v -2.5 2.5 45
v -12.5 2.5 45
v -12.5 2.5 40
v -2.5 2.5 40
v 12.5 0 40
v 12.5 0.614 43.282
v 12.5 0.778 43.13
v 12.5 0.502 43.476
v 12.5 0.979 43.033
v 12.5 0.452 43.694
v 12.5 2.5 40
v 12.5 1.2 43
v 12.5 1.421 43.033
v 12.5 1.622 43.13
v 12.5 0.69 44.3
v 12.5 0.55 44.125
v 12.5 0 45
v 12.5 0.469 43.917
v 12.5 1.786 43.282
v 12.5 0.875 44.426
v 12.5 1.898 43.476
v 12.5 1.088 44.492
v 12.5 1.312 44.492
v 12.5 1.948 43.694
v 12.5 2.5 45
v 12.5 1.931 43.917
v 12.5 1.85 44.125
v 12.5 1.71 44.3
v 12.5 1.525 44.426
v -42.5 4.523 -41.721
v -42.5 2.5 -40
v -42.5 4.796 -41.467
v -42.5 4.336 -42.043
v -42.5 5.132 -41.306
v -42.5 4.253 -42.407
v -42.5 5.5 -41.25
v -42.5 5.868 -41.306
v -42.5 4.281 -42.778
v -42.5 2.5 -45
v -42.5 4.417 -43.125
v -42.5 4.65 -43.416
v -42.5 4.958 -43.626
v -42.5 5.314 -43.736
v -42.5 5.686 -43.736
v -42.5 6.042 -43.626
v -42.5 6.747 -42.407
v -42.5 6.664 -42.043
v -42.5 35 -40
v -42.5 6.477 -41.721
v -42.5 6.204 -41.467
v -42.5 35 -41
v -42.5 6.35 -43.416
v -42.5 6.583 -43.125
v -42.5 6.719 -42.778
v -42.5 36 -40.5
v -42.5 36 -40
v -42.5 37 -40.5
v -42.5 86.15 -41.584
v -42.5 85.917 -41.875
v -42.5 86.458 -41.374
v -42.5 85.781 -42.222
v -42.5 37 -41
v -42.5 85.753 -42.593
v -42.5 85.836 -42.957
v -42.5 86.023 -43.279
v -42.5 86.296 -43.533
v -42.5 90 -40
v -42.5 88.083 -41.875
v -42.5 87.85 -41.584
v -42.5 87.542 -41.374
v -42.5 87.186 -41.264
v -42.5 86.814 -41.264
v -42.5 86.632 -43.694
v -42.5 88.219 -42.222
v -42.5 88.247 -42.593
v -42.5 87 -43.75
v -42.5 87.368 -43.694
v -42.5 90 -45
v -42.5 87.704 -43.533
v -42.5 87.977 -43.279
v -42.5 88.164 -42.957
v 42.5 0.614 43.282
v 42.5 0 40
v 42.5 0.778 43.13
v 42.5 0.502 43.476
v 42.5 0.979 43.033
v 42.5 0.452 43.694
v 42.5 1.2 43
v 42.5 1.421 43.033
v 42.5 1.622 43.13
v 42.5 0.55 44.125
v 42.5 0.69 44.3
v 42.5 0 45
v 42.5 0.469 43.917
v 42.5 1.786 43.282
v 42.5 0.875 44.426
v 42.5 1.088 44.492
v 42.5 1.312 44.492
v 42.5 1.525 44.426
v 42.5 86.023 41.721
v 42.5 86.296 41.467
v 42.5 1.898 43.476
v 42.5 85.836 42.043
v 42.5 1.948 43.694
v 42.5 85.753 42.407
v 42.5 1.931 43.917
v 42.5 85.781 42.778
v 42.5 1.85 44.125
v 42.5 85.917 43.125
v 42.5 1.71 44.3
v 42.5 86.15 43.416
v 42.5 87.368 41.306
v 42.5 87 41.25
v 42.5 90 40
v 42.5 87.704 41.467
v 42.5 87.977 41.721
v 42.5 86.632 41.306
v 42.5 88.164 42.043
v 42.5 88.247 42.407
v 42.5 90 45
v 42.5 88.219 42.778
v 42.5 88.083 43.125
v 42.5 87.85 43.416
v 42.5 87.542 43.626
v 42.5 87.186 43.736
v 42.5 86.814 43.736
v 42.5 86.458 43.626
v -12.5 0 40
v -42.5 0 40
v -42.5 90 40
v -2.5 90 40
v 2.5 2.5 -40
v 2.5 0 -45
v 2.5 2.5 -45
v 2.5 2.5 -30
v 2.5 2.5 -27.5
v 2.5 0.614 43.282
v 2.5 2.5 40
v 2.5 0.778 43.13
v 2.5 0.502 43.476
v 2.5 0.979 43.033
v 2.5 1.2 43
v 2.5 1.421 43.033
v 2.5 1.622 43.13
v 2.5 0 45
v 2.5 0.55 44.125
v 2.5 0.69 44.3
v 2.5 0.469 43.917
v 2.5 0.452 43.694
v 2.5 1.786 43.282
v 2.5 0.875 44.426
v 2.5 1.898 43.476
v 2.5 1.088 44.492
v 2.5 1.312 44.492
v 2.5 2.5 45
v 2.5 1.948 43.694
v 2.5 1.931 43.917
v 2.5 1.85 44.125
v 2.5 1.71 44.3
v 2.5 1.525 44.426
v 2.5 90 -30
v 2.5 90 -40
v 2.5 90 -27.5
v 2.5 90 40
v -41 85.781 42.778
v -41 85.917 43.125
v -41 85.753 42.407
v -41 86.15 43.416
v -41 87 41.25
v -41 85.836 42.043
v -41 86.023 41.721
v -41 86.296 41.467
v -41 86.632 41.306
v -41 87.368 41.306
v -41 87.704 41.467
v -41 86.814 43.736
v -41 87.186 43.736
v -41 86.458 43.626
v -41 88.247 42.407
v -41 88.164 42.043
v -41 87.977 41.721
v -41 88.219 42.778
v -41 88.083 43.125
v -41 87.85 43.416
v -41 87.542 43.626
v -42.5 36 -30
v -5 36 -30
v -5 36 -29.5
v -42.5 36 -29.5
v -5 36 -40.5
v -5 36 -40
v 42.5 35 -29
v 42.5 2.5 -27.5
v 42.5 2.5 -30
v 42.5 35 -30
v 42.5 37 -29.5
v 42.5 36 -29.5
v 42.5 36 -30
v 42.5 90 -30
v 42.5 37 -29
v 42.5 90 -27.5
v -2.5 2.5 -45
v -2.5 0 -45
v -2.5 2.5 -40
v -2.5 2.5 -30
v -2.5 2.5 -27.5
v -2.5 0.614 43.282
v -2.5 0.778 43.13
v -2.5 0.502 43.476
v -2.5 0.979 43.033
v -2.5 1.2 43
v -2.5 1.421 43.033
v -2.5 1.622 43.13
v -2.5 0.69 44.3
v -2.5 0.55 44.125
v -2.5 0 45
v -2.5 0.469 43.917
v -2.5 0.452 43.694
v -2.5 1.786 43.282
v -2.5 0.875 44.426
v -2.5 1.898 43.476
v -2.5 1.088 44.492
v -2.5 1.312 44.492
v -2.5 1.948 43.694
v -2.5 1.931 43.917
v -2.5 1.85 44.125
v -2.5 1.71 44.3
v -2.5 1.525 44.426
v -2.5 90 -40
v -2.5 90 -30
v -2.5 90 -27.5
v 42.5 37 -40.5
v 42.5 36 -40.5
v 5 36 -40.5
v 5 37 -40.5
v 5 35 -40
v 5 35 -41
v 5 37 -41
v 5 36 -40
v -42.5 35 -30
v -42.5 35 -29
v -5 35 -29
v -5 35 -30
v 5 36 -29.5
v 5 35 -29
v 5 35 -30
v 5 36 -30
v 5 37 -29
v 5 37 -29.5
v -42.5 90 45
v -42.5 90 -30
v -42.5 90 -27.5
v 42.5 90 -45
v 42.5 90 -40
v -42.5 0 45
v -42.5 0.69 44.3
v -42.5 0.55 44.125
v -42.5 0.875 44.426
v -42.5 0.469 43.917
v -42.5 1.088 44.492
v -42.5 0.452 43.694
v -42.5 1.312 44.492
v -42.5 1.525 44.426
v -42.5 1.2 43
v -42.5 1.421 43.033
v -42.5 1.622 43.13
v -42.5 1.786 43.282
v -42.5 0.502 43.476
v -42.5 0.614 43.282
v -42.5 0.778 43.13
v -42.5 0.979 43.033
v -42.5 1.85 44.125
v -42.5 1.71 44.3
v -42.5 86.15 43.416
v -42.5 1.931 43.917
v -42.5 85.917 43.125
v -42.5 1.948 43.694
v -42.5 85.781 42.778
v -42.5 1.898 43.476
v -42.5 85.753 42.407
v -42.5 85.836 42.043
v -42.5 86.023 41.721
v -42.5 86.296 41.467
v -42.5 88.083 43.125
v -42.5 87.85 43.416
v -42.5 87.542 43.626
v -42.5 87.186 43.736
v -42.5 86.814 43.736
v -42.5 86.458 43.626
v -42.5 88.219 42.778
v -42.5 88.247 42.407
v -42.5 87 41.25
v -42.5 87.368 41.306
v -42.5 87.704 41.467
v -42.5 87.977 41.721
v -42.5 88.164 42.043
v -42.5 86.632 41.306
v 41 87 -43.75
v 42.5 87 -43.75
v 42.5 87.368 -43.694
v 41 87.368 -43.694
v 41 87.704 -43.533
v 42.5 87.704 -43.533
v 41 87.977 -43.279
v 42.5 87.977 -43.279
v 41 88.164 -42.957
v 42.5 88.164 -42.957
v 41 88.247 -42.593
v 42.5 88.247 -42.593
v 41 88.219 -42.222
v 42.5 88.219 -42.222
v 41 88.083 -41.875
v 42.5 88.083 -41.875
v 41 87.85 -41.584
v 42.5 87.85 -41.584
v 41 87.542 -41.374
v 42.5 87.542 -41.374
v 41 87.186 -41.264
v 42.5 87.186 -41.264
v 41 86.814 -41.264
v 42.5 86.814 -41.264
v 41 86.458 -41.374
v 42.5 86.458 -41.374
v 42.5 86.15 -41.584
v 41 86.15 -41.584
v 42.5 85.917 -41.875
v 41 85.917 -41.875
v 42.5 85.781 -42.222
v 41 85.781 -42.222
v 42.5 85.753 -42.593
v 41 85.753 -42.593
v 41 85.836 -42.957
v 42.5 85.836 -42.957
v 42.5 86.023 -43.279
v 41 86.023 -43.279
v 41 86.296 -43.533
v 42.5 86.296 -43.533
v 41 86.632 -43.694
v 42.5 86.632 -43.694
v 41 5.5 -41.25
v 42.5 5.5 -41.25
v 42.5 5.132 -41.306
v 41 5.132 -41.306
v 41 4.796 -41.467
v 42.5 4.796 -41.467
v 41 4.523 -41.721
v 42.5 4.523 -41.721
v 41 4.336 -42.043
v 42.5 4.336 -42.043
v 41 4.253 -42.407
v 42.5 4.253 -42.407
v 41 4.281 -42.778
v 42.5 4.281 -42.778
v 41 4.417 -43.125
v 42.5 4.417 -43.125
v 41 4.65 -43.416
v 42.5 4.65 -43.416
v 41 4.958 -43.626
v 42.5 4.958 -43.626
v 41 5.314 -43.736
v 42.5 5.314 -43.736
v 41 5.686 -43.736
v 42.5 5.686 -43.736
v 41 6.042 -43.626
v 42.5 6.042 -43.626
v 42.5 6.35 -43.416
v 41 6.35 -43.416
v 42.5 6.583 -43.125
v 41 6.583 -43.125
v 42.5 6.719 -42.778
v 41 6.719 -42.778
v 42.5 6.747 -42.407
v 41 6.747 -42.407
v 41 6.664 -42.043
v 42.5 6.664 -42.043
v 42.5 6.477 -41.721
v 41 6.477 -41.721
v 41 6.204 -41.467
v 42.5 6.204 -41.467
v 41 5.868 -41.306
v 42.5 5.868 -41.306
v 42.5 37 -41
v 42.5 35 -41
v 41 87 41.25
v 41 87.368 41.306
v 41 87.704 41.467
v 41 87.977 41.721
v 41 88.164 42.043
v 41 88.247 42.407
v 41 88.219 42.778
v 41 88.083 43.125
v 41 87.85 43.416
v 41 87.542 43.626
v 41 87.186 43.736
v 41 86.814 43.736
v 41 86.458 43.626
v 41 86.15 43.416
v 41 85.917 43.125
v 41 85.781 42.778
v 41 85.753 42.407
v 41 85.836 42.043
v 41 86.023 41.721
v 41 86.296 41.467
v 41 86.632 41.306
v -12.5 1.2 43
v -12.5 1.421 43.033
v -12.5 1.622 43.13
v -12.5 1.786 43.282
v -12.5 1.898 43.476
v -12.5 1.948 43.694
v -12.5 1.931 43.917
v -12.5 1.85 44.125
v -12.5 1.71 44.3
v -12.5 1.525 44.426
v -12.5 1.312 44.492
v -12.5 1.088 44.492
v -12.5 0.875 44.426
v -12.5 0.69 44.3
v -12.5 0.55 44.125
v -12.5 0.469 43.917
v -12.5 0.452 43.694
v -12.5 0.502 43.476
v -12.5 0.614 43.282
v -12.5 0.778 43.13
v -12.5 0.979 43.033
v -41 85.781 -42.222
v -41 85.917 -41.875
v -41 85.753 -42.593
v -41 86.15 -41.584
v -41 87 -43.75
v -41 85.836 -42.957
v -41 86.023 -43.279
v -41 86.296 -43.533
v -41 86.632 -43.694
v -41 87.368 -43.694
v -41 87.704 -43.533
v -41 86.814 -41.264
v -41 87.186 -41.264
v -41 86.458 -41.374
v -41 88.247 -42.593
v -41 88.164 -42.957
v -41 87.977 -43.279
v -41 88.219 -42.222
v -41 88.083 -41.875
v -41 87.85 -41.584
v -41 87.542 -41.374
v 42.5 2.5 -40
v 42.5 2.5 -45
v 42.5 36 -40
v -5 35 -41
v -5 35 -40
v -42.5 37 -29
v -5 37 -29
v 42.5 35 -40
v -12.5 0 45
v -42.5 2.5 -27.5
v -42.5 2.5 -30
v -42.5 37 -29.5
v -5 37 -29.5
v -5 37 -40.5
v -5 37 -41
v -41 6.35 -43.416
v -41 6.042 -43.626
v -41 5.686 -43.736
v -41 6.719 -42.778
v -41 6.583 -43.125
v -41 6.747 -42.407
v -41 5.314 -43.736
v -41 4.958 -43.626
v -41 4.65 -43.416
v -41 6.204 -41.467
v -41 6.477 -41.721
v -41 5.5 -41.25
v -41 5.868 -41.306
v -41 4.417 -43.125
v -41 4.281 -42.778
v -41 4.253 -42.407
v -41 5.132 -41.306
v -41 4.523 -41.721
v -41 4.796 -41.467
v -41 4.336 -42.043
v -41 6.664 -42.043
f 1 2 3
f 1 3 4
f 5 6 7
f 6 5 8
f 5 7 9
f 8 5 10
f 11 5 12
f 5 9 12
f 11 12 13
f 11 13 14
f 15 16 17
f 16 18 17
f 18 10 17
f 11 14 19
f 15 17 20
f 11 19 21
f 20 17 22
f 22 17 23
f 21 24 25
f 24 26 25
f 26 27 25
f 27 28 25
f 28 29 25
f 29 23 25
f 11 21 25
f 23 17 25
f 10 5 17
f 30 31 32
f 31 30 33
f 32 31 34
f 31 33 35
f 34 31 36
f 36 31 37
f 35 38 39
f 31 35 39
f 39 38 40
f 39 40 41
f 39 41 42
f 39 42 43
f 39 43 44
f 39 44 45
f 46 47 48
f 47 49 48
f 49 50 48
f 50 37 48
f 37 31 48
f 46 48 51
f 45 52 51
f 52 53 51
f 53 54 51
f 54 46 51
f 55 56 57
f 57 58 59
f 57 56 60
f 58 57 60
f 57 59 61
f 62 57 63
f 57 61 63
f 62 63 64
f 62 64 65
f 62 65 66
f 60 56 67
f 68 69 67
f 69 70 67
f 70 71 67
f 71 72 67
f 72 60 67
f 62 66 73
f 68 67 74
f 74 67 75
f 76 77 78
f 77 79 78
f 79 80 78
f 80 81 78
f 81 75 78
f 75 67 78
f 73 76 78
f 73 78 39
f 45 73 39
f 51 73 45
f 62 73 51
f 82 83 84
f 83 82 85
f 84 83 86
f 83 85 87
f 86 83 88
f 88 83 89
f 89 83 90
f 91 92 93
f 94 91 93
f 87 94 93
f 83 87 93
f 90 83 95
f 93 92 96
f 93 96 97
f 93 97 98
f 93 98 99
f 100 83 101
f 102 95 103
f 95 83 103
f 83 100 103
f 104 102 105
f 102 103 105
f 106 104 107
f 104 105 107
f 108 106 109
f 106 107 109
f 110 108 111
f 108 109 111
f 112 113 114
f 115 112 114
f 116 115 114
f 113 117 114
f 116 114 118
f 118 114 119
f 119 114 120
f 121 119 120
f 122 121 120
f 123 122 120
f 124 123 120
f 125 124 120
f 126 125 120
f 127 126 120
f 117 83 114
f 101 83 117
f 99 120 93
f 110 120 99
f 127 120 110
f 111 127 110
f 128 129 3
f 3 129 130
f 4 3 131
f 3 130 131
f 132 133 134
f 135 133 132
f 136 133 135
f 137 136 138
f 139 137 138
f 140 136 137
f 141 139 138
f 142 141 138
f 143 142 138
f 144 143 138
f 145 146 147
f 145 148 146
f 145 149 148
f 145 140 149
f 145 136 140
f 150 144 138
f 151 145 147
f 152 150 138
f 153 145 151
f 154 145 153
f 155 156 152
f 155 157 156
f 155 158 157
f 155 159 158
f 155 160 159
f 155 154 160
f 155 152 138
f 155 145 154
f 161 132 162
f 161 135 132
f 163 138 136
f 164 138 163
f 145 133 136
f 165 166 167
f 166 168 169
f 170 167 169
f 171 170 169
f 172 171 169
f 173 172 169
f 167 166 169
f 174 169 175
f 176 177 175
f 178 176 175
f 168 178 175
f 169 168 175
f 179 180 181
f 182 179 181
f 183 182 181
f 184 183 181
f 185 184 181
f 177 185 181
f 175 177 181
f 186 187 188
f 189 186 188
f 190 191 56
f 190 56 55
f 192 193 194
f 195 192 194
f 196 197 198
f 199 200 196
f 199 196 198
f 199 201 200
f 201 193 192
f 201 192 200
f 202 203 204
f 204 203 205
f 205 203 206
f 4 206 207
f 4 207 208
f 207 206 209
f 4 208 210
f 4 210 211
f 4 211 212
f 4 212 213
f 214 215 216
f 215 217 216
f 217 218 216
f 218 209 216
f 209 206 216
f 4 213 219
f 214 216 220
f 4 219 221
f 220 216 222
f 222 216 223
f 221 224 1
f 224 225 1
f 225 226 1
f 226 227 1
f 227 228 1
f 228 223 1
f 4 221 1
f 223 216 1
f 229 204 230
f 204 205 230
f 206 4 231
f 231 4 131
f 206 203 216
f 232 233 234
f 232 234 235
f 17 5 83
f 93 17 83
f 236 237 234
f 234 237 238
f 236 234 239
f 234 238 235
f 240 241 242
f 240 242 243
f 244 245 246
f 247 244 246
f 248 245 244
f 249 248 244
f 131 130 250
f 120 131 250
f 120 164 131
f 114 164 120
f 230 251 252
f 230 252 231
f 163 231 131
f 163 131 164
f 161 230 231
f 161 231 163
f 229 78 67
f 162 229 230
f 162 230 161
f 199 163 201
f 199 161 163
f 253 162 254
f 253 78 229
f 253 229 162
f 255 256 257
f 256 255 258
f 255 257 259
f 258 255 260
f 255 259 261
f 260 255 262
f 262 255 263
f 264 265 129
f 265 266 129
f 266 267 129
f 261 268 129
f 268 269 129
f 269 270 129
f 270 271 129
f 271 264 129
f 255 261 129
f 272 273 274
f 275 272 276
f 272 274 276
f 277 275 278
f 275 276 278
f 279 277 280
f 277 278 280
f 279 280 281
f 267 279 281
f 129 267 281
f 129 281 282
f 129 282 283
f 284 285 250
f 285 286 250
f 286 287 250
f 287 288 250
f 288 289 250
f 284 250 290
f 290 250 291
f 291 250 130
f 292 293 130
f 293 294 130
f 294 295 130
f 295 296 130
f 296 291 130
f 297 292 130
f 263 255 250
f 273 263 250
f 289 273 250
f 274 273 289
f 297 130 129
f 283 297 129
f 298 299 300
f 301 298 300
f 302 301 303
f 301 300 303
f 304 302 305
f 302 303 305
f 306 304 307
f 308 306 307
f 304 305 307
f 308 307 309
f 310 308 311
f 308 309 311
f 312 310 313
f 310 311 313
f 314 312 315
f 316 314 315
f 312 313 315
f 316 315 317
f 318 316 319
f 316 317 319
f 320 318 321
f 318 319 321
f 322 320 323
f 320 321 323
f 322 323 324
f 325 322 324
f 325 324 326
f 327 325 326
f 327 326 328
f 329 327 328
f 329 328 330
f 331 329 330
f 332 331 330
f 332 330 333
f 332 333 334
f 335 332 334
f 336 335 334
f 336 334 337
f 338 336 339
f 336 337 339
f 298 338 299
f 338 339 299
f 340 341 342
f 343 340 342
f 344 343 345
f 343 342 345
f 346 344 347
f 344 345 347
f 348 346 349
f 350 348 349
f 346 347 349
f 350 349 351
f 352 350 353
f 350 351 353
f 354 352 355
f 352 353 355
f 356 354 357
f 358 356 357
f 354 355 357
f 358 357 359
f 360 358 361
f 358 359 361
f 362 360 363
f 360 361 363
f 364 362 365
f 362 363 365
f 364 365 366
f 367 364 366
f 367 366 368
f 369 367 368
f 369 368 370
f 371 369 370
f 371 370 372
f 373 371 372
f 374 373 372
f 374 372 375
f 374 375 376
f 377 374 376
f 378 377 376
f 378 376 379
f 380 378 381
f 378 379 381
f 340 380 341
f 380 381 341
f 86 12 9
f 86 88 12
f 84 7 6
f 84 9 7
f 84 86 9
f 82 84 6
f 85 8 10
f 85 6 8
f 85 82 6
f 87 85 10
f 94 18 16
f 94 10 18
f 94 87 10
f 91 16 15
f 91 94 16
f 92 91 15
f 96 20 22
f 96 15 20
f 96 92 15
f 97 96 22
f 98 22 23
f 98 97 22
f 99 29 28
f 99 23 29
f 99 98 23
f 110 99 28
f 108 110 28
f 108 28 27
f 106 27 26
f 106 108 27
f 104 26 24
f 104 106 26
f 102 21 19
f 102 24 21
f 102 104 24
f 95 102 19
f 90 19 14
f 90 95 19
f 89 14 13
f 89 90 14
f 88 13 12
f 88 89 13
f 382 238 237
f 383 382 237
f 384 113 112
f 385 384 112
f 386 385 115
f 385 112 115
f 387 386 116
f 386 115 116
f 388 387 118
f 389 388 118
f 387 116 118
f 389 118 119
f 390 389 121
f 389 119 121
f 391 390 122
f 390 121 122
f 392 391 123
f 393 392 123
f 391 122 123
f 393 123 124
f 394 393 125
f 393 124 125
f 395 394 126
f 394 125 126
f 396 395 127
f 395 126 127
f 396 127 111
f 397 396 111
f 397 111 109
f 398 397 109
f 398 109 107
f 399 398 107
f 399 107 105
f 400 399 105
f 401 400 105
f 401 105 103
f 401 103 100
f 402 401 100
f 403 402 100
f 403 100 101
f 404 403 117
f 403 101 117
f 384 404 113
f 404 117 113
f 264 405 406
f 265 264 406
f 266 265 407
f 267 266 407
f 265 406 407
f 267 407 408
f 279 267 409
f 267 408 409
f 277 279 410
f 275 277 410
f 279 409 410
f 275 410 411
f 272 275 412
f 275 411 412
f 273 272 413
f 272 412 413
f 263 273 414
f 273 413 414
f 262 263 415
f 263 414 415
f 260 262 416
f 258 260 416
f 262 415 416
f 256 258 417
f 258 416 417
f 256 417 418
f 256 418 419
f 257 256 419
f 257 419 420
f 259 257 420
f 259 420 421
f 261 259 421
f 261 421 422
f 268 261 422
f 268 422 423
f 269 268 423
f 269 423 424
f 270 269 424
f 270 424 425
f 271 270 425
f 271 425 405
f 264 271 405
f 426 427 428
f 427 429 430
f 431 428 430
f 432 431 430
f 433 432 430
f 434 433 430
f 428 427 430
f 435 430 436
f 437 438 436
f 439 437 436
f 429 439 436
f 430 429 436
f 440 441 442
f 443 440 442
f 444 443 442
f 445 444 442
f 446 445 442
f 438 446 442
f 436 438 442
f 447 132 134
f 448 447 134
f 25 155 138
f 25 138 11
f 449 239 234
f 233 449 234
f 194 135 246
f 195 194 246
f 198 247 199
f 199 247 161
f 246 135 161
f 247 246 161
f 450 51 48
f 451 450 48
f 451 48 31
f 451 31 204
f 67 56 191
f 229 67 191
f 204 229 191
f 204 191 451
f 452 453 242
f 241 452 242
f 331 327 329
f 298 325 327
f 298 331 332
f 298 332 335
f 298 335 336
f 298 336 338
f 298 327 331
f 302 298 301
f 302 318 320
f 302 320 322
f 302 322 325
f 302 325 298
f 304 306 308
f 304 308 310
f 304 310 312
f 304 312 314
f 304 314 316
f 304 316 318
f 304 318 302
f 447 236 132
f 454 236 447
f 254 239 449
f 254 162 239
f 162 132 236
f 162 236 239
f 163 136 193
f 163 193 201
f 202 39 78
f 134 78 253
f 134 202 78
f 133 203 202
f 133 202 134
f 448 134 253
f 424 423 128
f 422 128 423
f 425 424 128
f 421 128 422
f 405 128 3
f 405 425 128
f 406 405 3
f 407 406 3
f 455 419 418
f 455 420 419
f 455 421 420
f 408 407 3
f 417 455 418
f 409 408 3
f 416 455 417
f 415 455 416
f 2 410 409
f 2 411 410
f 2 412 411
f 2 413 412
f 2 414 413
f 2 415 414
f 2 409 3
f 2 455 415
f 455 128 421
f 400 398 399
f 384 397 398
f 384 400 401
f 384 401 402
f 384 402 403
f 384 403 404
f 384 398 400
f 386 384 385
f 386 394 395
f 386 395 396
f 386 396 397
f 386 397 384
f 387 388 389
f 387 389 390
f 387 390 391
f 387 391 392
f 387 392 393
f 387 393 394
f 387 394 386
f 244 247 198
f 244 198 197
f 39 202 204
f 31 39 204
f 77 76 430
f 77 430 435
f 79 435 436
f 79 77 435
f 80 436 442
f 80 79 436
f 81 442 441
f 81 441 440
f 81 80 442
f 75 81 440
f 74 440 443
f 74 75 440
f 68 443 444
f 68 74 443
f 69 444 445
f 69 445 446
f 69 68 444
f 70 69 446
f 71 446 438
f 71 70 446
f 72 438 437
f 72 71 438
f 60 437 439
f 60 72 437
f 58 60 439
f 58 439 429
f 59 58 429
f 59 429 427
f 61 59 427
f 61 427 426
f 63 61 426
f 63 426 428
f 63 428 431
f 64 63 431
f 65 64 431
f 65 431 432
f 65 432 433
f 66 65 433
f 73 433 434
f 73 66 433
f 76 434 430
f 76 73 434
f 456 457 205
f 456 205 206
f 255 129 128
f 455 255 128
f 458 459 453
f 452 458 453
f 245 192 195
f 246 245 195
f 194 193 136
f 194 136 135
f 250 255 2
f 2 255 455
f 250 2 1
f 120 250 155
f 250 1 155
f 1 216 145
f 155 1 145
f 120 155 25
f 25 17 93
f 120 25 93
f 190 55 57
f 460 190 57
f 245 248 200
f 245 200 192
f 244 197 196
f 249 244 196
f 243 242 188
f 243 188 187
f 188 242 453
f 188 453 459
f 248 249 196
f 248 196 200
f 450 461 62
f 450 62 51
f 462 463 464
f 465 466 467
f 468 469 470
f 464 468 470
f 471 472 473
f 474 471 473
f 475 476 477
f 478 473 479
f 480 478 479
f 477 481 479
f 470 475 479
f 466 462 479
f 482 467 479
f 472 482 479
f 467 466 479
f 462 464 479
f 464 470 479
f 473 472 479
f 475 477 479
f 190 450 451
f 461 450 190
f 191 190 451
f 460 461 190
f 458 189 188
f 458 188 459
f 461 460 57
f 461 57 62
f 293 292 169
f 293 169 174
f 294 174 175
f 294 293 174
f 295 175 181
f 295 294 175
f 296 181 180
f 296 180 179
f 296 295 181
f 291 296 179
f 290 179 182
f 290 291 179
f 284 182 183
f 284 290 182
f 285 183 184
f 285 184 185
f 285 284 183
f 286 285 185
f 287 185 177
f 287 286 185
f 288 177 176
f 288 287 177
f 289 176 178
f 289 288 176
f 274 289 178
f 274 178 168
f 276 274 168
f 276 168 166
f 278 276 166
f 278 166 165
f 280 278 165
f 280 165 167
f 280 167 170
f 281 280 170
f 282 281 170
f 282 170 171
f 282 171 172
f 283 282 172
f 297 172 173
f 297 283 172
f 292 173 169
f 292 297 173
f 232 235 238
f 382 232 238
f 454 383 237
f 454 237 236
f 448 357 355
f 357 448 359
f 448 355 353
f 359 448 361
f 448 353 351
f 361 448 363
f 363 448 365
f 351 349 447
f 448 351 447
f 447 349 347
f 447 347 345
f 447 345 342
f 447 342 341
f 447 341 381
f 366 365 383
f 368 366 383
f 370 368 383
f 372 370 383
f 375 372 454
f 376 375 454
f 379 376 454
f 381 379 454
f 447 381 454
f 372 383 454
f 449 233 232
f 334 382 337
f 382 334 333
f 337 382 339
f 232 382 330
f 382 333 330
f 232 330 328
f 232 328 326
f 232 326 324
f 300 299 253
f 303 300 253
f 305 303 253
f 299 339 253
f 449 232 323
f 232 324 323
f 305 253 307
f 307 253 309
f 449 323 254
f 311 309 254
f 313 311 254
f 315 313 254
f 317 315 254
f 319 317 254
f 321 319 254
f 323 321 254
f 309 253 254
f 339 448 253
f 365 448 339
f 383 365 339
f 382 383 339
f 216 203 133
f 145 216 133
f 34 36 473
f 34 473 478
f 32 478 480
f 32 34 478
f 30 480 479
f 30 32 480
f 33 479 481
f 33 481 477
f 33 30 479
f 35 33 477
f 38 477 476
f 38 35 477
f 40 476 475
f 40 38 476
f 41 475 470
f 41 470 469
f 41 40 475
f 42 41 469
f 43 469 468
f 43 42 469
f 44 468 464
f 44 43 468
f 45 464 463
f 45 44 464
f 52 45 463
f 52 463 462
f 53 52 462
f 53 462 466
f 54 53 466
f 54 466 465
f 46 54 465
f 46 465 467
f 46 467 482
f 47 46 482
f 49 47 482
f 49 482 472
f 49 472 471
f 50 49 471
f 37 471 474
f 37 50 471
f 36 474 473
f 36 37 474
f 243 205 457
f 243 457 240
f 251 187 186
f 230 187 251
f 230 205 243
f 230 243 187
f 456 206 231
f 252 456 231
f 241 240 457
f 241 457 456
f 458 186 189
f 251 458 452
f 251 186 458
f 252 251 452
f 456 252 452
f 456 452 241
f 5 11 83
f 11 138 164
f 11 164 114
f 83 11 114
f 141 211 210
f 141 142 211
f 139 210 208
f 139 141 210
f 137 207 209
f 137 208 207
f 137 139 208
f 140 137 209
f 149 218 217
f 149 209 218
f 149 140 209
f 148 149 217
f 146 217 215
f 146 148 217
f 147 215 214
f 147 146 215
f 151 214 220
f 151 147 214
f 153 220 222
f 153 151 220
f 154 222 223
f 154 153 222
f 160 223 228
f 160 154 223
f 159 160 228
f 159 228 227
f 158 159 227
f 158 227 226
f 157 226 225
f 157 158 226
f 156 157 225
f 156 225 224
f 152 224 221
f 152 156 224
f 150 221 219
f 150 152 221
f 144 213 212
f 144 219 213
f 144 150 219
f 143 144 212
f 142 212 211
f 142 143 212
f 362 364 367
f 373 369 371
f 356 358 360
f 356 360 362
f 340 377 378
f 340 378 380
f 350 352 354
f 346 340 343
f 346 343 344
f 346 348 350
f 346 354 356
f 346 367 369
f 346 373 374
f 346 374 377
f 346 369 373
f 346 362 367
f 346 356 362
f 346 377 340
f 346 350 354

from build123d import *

# Parameters (mm, degrees)
SKETCH1_W                = 90
SKETCH1_H                = 90
BOSS_EXTRUDE1_DEPTH      = 90
SKETCH4_W                = 40
SKETCH4_H                = 80
CUT_EXTRUDE3_DEPTH       = 90
SKETCH6_W                = 10
SKETCH6_H                = 2.5
CUT_EXTRUDE5_DEPTH       = 10
CUT_EXTRUDE6_DEPTH       = 90
CUT_EXTRUDE7_DEPTH       = 90
SKETCH10_W               = 2.5
SKETCH10_H               = 90
BOSS_EXTRUDE2_DEPTH      = 40
SKETCH11_W               = 2.5
SKETCH11_H               = 90
BOSS_EXTRUDE3_DEPTH      = 40
CUT_EXTRUDE10_DEPTH      = 37.5
SKETCH16_R               = 0.75
CUT_EXTRUDE12_DEPTH      = 1.5
CUT_EXTRUDE13_DEPTH      = 111.227038425
CUT_EXTRUDE13_DEPTH_BACK = 111.227038425
SKETCH17_R               = 0.75
SKETCH21_W               = 85
SKETCH21_H               = 2.5
CUT_EXTRUDE14_DEPTH      = 40
SKETCH22_W               = 85
SKETCH22_H               = 2.5
CUT_EXTRUDE15_DEPTH      = 40
SKETCH23_R               = 1.25
CUT_EXTRUDE16_DEPTH      = 1.5
SKETCH24_R               = 1.25
CUT_EXTRUDE17_DEPTH      = 1.5


with BuildPart() as part:
    # Sketch1 → Boss-Extrude1 (new body)
    with BuildSketch(Plane(origin=(0, 0, 0), x_dir=(1, 0, 0), z_dir=(0, 1, 0))):
        Rectangle(SKETCH1_W, SKETCH1_H)
    extrude(amount=BOSS_EXTRUDE1_DEPTH)

    # Sketch4 → Cut-Extrude3 (cut)
    with BuildSketch(Plane(origin=(0, 90, 0), x_dir=(1, 0, 0), z_dir=(0, 1, 0))):
        with Locations((-22.5, 0)):
            Rectangle(SKETCH4_W, SKETCH4_H)
        with Locations((22.5, 0)):
            Rectangle(SKETCH4_W, SKETCH4_H)
    extrude(amount=-CUT_EXTRUDE3_DEPTH, mode=Mode.SUBTRACT)

    # Sketch6 → Cut-Extrude5 (cut)
    with BuildSketch(Plane.XY.offset(45)):
        with Locations((7.5, 1.25)):
            Rectangle(SKETCH6_W, SKETCH6_H)
        with Locations((-7.5, 1.25)):
            Rectangle(SKETCH6_W, SKETCH6_H)
    extrude(amount=-CUT_EXTRUDE5_DEPTH, mode=Mode.SUBTRACT)

    # Sketch7 → Cut-Extrude6 (cut)
    with BuildSketch(Plane(origin=(0, 90, 0), x_dir=(1, 0, 0), z_dir=(0, 1, 0))):
        Polygon((42.5, 40), (42.5, 45), (45, 45), (45, -45), (42.5, -45), (42.5, -40), align=None)
    extrude(amount=-CUT_EXTRUDE6_DEPTH, mode=Mode.SUBTRACT)

    # Sketch8 → Cut-Extrude7 (cut)
    with BuildSketch(Plane(origin=(0, 90, 0), x_dir=(1, 0, 0), z_dir=(0, 1, 0))):
        Polygon((-42.5, 40), (-42.5, 45), (-45, 45), (-45, -45), (-42.5, -45), (-42.5, -42.5), align=None)
    extrude(amount=-CUT_EXTRUDE7_DEPTH, mode=Mode.SUBTRACT)

    # Sketch10 → Boss-Extrude2 (add)
    with BuildSketch(Plane.ZY.offset(2.5)):
        with Locations((-28.75, 45)):
            Rectangle(SKETCH10_W, SKETCH10_H)
    extrude(amount=BOSS_EXTRUDE2_DEPTH)

    # Sketch11 → Boss-Extrude3 (add)
    with BuildSketch(Plane(origin=(2.5, 0, 0), x_dir=(0, 0, -1), z_dir=(1, 0, 0))):
        with Locations((28.75, 45)):
            Rectangle(SKETCH11_W, SKETCH11_H)
    extrude(amount=BOSS_EXTRUDE3_DEPTH)

    # Sketch13 → Cut-Extrude10 (cut)
    with BuildSketch(Plane(origin=(42.5, 0, 0), x_dir=(0, 0, -1), z_dir=(1, 0, 0))):
        Polygon((40, 36), (40.5, 36), (40.5, 37), (41, 37), (41, 35), (40, 35), align=None)
        Polygon((29, 35), (30, 35), (30, 36), (29.5, 36), (29.5, 37), (29, 37), align=None)
    cut_extrude10 = extrude(amount=-CUT_EXTRUDE10_DEPTH, mode=Mode.SUBTRACT)

    # Mirror1: Cut-Extrude10 across plane
    add(cut_extrude10.mirror(Plane.ZY), mode=Mode.SUBTRACT)

    # Sketch16 → Cut-Extrude12 (cut)
    with BuildSketch(Plane(origin=(-12.5, 0, 0), x_dir=(0, 0, -1), z_dir=(1, 0, 0))):
        with Locations((-43.75, 1.2)):
            Circle(SKETCH16_R)
    extrude(amount=-CUT_EXTRUDE12_DEPTH, mode=Mode.SUBTRACT)

    # Sketch17 → Cut-Extrude13 (cut, two sides: drawn at the far end of the back side and taken through both)
    with BuildSketch(Plane.ZY.offset(2.5).offset(-CUT_EXTRUDE13_DEPTH_BACK)):
        with Locations(Location((43.75, 1.2, 0), (0, 0, 180))):
            Circle(SKETCH17_R)
    extrude(amount=CUT_EXTRUDE13_DEPTH + CUT_EXTRUDE13_DEPTH_BACK, mode=Mode.SUBTRACT)

    # Sketch21 → Cut-Extrude14 (cut)
    with BuildSketch(Plane(origin=(42.5, 0, 0), x_dir=(0, 0, -1), z_dir=(1, 0, 0))):
        with Locations((2.5, 1.25)):
            Rectangle(SKETCH21_W, SKETCH21_H)
    extrude(amount=-CUT_EXTRUDE14_DEPTH, mode=Mode.SUBTRACT)

    # Sketch22 → Cut-Extrude15 (cut)
    with BuildSketch(Plane.ZY.offset(42.5)):
        with Locations((-2.5, 1.25)):
            Rectangle(SKETCH22_W, SKETCH22_H)
    extrude(amount=-CUT_EXTRUDE15_DEPTH, mode=Mode.SUBTRACT)

    # Sketch23 → Cut-Extrude16 (cut)
    with BuildSketch(Plane(origin=(42.5, 0, 0), x_dir=(0, 0, -1), z_dir=(1, 0, 0))):
        with Locations((42.5, 87)):
            Circle(SKETCH23_R)
        with Locations(Location((42.5, 5.5, 0), (0, 0, 180))):
            Circle(SKETCH23_R)
    cut_extrude16 = extrude(amount=-CUT_EXTRUDE16_DEPTH, mode=Mode.SUBTRACT)

    # Sketch24 → Cut-Extrude17 (cut)
    with BuildSketch(Plane(origin=(42.5, 0, 0), x_dir=(0, 0, -1), z_dir=(1, 0, 0))):
        with Locations((-42.5, 87)):
            Circle(SKETCH24_R)
    cut_extrude17 = extrude(amount=-CUT_EXTRUDE17_DEPTH, mode=Mode.SUBTRACT)

    # Mirror2: Cut-Extrude16, Cut-Extrude17 across plane
    add(cut_extrude16.mirror(Plane.ZY), mode=Mode.SUBTRACT)
    add(cut_extrude17.mirror(Plane.ZY), mode=Mode.SUBTRACT)


solid = part.part
